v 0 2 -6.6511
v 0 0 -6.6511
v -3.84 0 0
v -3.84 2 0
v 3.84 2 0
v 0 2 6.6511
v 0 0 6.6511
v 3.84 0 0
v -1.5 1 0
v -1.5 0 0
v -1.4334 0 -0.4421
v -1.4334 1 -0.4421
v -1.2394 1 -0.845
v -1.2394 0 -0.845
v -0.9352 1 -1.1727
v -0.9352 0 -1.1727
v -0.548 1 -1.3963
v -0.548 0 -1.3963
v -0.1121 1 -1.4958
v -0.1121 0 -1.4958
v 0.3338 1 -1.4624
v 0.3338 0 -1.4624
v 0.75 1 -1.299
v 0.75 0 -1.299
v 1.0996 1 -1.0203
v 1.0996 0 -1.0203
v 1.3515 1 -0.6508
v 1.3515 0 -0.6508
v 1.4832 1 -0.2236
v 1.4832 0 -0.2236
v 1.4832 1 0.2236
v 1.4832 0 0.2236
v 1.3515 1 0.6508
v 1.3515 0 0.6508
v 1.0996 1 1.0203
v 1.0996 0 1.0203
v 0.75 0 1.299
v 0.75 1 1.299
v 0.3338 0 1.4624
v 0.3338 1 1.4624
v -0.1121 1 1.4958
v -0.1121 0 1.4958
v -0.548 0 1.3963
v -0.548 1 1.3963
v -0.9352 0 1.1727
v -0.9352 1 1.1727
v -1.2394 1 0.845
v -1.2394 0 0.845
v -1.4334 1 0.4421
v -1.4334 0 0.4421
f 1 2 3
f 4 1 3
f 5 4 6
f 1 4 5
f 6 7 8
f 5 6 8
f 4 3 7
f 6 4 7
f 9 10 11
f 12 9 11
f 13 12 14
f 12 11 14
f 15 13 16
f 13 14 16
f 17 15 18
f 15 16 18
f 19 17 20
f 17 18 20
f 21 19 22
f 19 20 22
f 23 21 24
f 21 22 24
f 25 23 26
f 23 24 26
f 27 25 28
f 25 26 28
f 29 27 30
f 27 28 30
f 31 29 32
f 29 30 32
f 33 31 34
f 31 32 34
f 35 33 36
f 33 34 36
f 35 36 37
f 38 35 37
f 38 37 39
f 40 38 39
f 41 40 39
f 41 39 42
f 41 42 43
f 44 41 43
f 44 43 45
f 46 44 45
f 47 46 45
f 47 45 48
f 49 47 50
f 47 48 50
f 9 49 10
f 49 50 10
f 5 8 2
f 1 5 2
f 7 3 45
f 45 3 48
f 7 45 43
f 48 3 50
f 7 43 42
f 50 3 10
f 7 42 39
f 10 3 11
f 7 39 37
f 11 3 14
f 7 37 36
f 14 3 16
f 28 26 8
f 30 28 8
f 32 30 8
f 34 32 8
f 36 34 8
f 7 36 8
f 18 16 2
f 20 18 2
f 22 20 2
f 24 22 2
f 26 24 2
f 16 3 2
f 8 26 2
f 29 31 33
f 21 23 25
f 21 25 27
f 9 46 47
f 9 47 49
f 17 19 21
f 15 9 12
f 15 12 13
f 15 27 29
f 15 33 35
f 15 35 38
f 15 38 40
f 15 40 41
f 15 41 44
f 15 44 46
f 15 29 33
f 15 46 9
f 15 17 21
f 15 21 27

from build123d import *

# Parameters (mm, degrees)
BOSS_EXTRUDE1_DEPTH = 2
SKETCH2_R           = 1.5
CUT_EXTRUDE1_DEPTH  = 1


with BuildPart() as part:
    # Sketch1 → Boss-Extrude1 (new body)
    with BuildSketch(Plane(origin=(0, 0, 0), x_dir=(1, 0, 0), z_dir=(0, 1, 0))):
        Polygon((0, 6.651075101), (-3.84, 0), (0, -6.651075101), (3.84, 0), align=None)
    extrude(amount=BOSS_EXTRUDE1_DEPTH)

    # Sketch2 → Cut-Extrude1 (cut)
    with BuildSketch(Plane(origin=(0, 0, 0), x_dir=(-1, 0, 0), z_dir=(0, -1, 0))):
        Circle(SKETCH2_R)
    extrude(amount=-CUT_EXTRUDE1_DEPTH, mode=Mode.SUBTRACT)


solid = part.part
